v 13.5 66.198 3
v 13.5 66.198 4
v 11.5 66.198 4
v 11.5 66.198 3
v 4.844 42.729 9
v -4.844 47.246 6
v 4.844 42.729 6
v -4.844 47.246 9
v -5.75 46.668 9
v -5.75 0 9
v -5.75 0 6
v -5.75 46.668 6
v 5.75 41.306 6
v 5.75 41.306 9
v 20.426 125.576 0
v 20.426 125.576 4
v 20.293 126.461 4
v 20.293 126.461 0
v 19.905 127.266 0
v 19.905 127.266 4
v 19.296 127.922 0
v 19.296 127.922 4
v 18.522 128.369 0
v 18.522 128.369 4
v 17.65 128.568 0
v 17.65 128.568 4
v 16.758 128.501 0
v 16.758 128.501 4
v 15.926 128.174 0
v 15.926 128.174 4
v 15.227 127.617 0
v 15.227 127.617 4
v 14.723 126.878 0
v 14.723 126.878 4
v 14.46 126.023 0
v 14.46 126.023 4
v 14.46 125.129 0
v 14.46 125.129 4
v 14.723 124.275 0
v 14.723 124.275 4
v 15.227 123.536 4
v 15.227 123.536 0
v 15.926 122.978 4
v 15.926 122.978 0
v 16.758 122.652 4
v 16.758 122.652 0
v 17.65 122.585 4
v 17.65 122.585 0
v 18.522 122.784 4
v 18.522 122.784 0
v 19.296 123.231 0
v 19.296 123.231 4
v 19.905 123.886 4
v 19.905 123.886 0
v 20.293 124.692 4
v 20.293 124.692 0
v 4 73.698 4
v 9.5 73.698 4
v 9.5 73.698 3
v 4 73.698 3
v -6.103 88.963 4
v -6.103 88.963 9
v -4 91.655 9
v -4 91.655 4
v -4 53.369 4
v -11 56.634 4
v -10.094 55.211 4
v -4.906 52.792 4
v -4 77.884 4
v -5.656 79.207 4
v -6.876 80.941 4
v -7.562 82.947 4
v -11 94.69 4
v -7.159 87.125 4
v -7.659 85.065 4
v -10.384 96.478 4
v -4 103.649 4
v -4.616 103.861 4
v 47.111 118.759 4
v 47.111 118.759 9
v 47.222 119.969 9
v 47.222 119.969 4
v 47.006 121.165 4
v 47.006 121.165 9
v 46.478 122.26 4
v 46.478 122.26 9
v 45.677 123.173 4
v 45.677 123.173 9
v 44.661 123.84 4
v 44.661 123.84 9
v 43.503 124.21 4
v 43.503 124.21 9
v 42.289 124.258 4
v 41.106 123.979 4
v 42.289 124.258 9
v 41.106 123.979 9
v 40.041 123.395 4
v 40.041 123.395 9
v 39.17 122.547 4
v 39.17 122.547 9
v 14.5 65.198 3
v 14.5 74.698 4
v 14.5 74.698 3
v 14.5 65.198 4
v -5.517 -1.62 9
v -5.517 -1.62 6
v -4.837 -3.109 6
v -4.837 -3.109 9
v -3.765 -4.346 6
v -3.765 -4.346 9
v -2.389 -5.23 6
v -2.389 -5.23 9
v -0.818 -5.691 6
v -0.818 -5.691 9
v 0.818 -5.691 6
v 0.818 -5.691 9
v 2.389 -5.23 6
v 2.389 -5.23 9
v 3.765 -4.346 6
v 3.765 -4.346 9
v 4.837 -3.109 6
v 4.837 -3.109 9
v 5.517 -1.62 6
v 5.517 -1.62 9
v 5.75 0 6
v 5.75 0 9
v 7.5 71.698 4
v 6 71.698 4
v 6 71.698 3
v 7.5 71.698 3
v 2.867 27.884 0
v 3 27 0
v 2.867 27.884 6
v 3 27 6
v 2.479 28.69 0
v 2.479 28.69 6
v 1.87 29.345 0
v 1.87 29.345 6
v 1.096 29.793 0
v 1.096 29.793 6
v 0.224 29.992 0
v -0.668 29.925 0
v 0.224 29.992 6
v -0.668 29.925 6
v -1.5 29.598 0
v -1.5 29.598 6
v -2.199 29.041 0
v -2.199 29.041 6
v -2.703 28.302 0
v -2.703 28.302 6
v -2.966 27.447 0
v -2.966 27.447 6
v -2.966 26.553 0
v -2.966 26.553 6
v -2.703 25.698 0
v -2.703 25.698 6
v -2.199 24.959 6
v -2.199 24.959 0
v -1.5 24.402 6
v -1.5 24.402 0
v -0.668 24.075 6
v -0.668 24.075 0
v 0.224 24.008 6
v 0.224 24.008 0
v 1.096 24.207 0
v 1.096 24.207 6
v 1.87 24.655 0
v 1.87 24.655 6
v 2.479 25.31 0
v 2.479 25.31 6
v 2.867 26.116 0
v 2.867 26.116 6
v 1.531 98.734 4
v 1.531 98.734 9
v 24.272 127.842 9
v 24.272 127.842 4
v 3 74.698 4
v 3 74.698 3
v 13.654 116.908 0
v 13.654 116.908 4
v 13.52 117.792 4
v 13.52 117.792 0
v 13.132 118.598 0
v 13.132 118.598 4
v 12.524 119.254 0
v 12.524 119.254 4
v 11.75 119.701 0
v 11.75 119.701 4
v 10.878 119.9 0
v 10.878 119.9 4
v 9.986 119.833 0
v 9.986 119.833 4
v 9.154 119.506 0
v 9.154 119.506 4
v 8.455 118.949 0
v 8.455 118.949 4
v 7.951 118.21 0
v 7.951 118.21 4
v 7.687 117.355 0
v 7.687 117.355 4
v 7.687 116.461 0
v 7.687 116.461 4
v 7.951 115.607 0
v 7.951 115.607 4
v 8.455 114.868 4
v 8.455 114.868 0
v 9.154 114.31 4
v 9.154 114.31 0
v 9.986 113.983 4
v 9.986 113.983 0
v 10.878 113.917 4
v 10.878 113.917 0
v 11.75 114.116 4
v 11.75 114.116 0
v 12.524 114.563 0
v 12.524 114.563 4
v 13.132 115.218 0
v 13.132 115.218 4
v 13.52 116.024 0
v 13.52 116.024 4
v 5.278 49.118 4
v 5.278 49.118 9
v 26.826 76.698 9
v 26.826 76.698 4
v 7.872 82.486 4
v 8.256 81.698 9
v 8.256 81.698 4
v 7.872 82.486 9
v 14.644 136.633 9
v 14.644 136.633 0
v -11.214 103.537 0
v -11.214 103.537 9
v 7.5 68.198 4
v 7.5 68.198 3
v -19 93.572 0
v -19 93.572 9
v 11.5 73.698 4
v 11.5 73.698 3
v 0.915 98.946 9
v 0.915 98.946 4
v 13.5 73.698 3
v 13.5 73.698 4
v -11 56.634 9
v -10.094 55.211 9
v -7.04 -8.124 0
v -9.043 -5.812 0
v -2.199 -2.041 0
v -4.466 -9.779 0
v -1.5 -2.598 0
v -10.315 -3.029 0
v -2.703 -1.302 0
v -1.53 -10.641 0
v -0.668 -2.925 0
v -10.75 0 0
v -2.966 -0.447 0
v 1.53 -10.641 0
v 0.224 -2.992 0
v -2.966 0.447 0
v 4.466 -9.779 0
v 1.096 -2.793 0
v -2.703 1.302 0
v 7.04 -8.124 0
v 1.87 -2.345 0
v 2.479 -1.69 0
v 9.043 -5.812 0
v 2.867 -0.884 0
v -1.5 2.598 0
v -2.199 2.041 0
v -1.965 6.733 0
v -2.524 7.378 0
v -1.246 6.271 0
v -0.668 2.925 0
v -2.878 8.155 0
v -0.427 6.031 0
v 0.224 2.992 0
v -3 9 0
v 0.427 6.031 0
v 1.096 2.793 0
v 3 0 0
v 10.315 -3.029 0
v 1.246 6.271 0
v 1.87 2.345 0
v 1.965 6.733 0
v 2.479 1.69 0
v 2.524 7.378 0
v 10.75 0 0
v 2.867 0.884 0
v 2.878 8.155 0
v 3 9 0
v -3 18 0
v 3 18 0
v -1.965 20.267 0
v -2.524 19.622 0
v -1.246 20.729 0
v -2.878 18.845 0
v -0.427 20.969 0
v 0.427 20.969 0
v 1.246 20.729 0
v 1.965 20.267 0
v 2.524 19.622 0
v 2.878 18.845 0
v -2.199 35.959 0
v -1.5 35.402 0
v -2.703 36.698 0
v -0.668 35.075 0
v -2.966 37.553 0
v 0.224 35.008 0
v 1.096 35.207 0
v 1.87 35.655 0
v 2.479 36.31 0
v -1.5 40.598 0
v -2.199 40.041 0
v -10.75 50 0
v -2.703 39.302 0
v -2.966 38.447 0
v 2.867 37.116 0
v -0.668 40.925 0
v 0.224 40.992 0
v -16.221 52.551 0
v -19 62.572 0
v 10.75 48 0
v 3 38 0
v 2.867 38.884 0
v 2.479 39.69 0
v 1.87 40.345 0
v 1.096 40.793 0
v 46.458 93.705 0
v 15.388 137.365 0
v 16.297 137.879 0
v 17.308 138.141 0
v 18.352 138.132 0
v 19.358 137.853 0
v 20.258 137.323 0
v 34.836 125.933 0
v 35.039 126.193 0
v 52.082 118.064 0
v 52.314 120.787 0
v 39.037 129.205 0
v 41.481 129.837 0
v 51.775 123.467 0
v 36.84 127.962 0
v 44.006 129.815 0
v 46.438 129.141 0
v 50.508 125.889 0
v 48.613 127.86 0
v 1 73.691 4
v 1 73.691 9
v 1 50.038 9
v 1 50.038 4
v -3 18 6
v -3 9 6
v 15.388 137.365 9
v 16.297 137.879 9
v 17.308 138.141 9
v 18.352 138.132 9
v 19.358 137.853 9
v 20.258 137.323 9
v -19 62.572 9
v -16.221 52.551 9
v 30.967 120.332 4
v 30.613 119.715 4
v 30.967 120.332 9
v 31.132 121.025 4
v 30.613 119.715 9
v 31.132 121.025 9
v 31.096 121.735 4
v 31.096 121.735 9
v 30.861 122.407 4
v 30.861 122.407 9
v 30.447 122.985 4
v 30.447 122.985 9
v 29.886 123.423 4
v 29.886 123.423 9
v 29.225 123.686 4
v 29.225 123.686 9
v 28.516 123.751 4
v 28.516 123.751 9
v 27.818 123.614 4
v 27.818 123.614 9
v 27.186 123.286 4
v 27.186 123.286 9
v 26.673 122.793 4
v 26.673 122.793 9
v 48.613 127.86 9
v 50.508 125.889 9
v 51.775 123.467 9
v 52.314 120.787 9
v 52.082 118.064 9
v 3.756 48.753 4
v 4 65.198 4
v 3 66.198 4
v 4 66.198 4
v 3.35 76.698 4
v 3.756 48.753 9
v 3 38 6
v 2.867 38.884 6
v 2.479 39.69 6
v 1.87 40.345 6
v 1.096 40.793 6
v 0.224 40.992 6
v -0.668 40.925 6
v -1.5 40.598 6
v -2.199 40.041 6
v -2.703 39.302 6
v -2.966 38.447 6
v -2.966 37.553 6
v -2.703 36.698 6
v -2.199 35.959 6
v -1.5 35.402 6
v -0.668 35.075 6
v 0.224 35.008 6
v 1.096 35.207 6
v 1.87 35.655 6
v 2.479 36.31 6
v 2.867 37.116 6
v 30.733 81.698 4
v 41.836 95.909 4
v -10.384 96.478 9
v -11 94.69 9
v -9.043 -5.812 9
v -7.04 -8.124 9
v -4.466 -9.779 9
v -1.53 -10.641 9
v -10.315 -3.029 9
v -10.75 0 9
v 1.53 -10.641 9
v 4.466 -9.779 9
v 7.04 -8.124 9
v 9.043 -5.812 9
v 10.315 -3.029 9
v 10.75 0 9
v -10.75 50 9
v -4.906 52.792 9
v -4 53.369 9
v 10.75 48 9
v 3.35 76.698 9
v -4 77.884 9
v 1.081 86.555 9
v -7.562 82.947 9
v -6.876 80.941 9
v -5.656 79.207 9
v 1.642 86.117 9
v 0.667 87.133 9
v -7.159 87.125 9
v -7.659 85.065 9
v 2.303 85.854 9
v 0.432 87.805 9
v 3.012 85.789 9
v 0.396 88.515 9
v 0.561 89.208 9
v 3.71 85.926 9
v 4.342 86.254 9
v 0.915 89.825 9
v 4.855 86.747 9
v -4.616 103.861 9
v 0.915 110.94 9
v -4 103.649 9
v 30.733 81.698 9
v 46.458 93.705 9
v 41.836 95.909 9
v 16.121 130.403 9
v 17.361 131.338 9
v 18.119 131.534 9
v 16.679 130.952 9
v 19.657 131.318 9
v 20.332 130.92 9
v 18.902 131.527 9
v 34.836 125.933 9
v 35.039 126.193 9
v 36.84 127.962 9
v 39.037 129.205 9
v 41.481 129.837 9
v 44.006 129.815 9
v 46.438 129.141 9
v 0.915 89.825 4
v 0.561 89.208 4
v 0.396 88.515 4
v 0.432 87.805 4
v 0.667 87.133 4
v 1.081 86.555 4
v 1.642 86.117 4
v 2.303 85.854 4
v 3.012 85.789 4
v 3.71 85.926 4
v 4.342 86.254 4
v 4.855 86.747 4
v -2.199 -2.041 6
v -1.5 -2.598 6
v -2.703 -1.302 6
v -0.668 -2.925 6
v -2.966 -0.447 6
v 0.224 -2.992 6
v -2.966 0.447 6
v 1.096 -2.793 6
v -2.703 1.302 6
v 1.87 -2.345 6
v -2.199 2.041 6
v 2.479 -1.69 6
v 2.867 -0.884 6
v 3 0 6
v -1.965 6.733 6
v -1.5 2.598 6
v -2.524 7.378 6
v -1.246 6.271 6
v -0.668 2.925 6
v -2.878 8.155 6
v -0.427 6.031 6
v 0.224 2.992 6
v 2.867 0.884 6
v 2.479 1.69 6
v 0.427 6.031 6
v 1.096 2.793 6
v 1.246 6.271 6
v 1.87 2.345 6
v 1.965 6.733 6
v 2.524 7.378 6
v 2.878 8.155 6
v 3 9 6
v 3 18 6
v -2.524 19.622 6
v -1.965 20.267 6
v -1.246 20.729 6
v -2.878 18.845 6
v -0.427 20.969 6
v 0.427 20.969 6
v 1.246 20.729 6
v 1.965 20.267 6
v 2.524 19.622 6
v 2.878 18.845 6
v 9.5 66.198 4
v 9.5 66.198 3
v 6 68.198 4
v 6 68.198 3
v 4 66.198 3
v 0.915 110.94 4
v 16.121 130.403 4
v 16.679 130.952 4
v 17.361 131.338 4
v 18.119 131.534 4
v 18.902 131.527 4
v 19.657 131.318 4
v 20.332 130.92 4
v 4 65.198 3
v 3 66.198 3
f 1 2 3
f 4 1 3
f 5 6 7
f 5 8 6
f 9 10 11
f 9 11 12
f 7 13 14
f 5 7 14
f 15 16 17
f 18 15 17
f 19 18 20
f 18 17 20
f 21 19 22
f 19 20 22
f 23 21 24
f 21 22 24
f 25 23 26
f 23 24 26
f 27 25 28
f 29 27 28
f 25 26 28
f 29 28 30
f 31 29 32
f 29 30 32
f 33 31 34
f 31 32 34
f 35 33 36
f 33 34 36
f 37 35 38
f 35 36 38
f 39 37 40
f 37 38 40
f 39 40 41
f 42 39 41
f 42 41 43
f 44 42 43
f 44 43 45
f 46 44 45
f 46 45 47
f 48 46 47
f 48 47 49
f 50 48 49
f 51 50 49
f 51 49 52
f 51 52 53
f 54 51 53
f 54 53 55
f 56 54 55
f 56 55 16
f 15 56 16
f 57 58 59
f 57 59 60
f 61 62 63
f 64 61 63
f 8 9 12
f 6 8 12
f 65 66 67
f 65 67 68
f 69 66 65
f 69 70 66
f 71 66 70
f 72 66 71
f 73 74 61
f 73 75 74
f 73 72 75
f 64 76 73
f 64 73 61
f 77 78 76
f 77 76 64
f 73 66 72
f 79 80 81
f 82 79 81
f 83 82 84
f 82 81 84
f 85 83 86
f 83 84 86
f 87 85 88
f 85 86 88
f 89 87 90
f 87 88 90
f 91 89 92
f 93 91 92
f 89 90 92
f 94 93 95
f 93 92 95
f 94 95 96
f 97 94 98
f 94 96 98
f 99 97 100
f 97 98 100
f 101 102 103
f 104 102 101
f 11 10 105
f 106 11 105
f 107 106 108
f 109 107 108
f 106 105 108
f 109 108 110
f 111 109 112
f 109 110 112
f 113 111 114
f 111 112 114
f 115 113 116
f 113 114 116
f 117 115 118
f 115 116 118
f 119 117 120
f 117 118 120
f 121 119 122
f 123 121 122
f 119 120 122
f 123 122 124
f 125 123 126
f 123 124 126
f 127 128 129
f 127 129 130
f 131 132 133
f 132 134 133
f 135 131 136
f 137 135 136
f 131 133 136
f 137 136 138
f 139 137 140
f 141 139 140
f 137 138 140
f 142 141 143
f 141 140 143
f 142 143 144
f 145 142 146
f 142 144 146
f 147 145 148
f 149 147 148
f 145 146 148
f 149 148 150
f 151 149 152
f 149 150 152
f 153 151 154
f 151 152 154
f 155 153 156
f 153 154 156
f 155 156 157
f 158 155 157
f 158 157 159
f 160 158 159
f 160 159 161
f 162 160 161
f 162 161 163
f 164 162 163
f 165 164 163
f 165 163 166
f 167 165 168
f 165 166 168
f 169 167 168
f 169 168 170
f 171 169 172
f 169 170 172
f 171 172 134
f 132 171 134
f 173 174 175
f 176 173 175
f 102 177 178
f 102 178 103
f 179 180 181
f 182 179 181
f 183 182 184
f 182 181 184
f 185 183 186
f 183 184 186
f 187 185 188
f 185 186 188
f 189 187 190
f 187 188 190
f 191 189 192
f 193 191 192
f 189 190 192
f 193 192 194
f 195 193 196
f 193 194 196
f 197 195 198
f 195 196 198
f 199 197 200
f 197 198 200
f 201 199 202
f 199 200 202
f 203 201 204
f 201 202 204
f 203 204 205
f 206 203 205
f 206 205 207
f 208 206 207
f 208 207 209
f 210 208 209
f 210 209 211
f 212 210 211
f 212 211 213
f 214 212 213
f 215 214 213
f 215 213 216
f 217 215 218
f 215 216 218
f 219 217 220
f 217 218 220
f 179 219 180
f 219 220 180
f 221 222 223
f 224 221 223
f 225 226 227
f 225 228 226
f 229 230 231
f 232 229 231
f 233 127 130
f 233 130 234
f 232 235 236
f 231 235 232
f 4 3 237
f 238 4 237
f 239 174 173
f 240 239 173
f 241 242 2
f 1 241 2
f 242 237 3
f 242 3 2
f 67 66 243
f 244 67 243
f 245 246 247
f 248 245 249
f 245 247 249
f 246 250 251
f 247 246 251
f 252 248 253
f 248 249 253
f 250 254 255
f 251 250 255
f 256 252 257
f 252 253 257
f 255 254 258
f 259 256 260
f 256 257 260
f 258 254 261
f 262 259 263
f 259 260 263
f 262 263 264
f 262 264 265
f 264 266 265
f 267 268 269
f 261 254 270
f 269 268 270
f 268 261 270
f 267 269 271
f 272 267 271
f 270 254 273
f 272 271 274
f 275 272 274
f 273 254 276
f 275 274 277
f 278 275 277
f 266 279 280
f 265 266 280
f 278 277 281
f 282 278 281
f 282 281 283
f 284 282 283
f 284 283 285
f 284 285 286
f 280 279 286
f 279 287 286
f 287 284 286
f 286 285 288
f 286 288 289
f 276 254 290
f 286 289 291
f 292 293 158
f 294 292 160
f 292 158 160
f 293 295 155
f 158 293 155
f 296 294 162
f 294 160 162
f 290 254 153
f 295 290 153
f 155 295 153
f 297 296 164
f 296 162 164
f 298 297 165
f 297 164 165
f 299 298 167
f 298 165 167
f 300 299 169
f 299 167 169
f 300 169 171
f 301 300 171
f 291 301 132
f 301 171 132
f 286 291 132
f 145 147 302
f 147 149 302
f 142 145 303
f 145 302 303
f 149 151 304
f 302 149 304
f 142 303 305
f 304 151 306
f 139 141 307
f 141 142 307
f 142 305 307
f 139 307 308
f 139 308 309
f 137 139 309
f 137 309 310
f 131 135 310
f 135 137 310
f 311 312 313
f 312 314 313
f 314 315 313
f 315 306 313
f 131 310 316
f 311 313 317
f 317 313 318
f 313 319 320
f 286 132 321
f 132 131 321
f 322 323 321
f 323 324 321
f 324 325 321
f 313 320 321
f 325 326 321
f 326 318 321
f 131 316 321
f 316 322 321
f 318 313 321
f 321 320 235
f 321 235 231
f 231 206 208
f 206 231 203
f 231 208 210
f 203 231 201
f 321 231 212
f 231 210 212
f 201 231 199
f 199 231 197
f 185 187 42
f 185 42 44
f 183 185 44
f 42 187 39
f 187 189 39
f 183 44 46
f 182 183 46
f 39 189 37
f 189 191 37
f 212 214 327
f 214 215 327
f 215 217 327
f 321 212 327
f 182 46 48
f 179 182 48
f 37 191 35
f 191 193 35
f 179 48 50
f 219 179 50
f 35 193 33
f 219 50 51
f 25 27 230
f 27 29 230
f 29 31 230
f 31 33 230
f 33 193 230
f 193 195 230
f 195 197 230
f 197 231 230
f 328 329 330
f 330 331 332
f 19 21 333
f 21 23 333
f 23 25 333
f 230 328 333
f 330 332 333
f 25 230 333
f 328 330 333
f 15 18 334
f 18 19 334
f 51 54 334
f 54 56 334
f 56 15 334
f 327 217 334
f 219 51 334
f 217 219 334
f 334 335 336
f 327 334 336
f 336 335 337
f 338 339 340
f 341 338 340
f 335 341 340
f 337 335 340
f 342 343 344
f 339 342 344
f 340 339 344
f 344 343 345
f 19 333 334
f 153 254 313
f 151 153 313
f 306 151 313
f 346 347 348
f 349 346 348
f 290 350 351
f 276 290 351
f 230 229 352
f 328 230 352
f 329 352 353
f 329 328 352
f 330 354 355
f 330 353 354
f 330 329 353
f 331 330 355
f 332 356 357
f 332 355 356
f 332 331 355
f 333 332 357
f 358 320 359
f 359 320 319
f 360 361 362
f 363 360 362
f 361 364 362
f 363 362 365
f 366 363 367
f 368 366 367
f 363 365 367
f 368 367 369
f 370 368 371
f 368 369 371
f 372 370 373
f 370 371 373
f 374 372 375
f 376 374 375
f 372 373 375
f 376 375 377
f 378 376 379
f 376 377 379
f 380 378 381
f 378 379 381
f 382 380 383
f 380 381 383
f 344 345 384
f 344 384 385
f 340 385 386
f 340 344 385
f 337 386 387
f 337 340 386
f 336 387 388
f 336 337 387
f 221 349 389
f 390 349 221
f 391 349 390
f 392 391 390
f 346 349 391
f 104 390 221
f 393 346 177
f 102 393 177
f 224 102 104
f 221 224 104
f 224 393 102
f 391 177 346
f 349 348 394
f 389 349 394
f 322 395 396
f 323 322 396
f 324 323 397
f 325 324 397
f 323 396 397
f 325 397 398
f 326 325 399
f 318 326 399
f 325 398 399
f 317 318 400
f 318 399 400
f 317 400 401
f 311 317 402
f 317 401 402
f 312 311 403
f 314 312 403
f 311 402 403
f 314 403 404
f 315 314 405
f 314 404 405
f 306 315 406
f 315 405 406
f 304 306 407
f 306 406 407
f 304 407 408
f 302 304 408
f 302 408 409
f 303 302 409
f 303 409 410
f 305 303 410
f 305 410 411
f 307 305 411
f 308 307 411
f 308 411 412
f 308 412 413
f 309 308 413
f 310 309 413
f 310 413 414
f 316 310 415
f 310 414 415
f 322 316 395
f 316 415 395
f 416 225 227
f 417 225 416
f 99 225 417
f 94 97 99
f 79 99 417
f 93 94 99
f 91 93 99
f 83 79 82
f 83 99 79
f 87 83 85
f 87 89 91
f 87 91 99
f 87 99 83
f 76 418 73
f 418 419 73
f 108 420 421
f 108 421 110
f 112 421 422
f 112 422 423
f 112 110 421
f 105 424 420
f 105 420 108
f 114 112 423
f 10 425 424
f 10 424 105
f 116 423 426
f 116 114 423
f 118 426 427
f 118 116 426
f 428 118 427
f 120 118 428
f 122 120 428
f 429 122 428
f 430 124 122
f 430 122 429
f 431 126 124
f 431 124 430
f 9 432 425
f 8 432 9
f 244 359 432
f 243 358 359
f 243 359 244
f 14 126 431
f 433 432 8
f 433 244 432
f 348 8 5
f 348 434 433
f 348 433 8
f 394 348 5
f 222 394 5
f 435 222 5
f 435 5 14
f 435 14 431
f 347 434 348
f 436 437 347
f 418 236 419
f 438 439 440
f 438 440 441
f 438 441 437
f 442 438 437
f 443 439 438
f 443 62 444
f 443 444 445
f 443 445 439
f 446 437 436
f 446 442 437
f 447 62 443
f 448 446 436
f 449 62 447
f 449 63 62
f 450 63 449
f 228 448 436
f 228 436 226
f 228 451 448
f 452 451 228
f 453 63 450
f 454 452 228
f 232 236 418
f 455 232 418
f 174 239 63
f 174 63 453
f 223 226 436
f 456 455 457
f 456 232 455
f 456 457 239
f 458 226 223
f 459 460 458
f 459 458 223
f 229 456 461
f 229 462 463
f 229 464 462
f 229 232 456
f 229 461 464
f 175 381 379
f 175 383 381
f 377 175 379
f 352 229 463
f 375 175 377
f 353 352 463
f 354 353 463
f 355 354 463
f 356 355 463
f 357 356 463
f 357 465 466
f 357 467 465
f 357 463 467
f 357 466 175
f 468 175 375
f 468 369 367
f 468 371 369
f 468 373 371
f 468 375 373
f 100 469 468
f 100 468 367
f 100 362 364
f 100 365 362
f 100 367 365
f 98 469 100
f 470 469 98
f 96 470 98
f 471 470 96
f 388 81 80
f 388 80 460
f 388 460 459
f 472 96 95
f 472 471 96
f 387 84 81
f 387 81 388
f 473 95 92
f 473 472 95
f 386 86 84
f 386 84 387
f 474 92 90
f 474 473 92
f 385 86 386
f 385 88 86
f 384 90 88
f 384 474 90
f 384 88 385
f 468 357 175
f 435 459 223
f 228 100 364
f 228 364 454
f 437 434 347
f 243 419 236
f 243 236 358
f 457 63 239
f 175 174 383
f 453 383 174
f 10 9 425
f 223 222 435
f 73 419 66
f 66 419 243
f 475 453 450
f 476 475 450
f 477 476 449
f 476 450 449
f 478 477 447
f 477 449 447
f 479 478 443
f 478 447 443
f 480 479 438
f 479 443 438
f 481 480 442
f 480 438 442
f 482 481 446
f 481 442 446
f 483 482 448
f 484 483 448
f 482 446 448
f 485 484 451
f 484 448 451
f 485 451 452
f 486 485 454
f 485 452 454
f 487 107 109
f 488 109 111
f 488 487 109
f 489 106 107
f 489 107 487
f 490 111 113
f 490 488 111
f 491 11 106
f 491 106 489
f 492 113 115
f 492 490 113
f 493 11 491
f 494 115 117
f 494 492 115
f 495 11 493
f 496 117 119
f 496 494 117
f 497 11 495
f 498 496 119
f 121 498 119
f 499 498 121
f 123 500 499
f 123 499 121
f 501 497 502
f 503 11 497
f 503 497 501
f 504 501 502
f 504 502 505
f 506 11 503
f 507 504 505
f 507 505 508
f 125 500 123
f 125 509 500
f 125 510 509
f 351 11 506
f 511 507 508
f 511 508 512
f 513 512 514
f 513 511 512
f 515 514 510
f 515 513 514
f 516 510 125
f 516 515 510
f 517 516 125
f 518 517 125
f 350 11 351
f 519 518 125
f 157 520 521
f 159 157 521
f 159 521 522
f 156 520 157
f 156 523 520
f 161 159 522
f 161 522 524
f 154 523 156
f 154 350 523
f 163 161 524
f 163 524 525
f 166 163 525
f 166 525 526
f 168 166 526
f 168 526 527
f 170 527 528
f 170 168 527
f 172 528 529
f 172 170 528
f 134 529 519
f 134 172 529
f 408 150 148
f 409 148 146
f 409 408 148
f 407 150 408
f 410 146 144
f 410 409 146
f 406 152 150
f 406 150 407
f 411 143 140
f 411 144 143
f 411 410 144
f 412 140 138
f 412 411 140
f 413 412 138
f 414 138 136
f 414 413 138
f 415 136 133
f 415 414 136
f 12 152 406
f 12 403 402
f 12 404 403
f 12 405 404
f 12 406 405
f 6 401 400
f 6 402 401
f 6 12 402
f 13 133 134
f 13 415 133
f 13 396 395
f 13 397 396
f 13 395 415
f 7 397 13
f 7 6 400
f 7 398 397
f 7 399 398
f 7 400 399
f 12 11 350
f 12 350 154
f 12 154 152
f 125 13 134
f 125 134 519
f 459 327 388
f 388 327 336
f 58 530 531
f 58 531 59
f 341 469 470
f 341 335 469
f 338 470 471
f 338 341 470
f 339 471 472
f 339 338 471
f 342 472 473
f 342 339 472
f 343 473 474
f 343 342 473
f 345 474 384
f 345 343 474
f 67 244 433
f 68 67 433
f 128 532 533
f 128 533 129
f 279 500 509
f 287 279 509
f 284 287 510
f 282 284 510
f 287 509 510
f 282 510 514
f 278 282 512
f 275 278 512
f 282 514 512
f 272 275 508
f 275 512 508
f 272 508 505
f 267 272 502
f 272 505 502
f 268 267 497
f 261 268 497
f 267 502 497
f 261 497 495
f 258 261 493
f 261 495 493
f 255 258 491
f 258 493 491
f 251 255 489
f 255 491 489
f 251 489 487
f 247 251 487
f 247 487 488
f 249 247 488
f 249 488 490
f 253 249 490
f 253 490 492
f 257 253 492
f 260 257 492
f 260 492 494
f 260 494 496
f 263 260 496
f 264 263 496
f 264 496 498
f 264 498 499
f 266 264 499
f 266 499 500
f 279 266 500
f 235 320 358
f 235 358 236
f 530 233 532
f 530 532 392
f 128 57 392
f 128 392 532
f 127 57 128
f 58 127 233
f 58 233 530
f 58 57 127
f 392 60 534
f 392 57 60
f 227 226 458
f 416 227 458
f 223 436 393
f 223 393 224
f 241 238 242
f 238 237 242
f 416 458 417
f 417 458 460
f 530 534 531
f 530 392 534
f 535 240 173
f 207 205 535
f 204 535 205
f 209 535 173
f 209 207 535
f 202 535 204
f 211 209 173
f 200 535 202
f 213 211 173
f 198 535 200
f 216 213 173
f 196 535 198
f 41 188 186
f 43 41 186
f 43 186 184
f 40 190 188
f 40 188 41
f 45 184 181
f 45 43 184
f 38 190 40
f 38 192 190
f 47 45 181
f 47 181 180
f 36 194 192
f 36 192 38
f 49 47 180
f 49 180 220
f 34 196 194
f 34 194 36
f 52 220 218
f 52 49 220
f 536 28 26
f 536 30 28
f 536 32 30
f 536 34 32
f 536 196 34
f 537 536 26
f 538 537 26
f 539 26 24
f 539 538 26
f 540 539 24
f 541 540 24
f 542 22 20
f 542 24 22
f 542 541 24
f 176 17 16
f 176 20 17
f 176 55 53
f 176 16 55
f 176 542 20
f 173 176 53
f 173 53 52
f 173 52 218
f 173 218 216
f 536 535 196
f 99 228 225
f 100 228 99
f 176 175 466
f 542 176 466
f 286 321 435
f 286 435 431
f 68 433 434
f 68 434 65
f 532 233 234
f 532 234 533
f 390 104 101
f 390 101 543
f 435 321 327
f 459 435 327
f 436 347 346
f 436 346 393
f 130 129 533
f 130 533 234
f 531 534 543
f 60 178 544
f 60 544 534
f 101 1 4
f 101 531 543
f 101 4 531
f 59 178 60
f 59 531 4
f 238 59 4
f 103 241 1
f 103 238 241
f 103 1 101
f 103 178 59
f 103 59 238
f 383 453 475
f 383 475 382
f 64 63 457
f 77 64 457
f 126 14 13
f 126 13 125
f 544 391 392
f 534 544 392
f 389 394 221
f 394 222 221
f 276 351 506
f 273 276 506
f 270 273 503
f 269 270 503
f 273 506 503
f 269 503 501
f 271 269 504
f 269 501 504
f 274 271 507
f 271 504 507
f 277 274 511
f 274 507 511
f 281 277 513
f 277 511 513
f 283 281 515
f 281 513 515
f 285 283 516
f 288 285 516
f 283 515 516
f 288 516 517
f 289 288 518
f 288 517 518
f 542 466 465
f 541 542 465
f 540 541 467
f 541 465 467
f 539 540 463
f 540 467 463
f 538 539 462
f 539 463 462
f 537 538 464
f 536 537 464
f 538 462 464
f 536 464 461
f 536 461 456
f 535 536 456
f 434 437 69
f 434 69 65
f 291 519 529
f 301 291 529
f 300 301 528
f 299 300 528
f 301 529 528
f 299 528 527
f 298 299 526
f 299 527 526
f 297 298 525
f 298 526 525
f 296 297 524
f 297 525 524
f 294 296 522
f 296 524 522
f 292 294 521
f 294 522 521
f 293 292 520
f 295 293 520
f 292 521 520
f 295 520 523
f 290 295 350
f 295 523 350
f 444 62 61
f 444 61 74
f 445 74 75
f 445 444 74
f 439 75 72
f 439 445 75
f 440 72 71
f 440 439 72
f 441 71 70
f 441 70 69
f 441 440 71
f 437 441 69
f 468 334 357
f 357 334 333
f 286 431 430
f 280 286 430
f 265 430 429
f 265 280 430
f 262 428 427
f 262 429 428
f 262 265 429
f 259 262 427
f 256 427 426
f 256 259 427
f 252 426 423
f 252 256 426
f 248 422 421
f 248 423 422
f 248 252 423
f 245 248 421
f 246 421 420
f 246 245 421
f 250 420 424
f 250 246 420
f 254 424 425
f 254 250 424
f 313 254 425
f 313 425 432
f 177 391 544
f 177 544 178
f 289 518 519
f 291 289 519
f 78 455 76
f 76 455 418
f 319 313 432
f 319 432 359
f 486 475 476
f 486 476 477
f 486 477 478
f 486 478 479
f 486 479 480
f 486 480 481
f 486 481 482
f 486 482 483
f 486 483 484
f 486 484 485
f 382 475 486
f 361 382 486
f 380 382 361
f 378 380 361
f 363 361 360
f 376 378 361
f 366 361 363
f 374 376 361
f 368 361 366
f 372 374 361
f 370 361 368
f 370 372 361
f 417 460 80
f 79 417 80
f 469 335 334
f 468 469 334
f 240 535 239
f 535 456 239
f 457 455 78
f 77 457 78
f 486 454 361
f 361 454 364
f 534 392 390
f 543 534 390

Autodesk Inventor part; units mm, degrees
ref_plane "YZ Plane" through (0, 0, 0) normal (1, 0, 0) x (0, 1, 0)
sketch "Base" plane through (0, 0, 0) normal (0, 0, 1) x (1, 0, 0)
  line L0 (0, -40.5971) -> (0, 168.3327) construction
  arc A0 (-10.75, 0) -> (10.75, 0) centre (0, 0) ccw
  line L1 (10.75, 48) -> (10.75, 0)
  line L2 (-10.75, 0) -> (-10.75, 50)
  line L3 (-19, 62.5716) -> (-16.2211, 52.5512)
  line L4 (-10.75, 50) -> (-16.2211, 52.5512)
  line L5 (-19, 62.5716) -> (-19, 93.5716)
  line L6 (-19, 93.5716) -> (-11.2142, 103.5369)
  line L7 (10.75, 48) -> (46.4584, 93.7046)
  line L8 (46.4584, 93.7046) -> (52.0821, 118.0639)
  arc A1 (52.0821, 118.0639) -> (48.6133, 127.8595) centre (42.6597, 120.2392) ccw
  arc A2 (48.6133, 127.8595) -> (35.0394, 126.1928) centre (42.6597, 120.2392) ccw
  line L9 (34.8364, 125.933) -> (20.2582, 137.3228)
  line L10 (35.0394, 126.1928) -> (34.8364, 125.933)
  arc A3 (20.2582, 137.3228) -> (14.6435, 136.6334) centre (17.7956, 134.1707) ccw
  line L11 (14.6435, 136.6334) -> (-11.2142, 103.5369)
  line L12 (42.6597, 120.2392) -> (48.6133, 127.8595) construction
  dimension "d0" = 142
  dimension "d1" = 155
  dimension "d2" = 21.5
  dimension "d3" = 115
  dimension "d4" = 130.5
  dimension "d7" = 51.5
  dimension "d8" = 18.5
  dimension "d9" = 4
  dimension "d10" = 58
  dimension "d11" = 25
  dimension "d14" = 42
  dimension "d15" = 50
  dimension "d18" = 10
  dimension "d57" = 48
  dimension "d100" = 19
  dimension "d101" = 31
extrude "BaseFeature" add sketch "Base" along normal blind 9
ref_plane "SunkenDetailsPlane" through (0, 0, 9) normal (0, 0, 1) x (1, 0, 0)
sketch "SunkenDetails" plane through (0, 0, 9) normal (0, 0, 1) x (1, 0, 0)
  line L0 (0.9151, 89.8249) -> (26.6729, 122.7934)
  line L1 (4.8551, 86.7466) -> (30.613, 119.7151)
  arc A0 (30.613, 119.7151) -> (26.6729, 122.7934) centre (28.6429, 121.2543) ccw
  line L2 (0.9151, 97.9462) -> (24.272, 127.8418)
  line L3 (24.272, 127.8418) -> (20.332, 130.9201)
  line L4 (16.1209, 130.403) -> (0.9151, 110.9404)
  arc A1 (20.332, 130.9201) -> (16.1209, 130.403) centre (18.485, 128.556) ccw
  line L5 (-4, 91.6552) -> (-4, 104.6494)
  line L6 (-4, 104.6494) -> (-11, 95.6898)
  line L7 (-11, 95.6898) -> (-11, 55.6335)
  line L8 (-11, 55.6335) -> (-4, 52.3693)
  line L9 (-4, 77.8836) -> (-4, 52.3693)
  arc A2 (-6.1033, 88.9631) -> (-4, 77.8836) centre (-0.1932, 84.3457) ccw
  line L10 (-6.1033, 88.9631) -> (-4, 91.6552)
  line L11 (5.75, 42.3059) -> (5.75, 0)
  line L12 (-5.75, 47.6685) -> (5.75, 42.3059)
  line L13 (-5.75, 0) -> (-5.75, 47.6685)
  arc A3 (-5.75, 0) -> (5.75, 0) centre (0, 0) ccw
  line L14 (4.6626, 48.3299) -> (26.8264, 76.6983)
  line L15 (3.3496, 76.6983) -> (26.8264, 76.6983)
  line L16 (1, 73.6909) -> (3.3496, 76.6983)
  arc A4 (0.9151, 89.8249) -> (4.8551, 86.7466) centre (2.8851, 88.2857) ccw
  line L17 (7.256, 81.6983) -> (30.7329, 81.6983)
  line L18 (7.256, 81.6983) -> (39.1705, 122.5469)
  line L19 (30.7329, 81.6983) -> (41.8359, 95.9094)
  line L20 (41.8359, 95.9094) -> (47.1112, 118.7594)
  arc A5 (47.1112, 118.7594) -> (39.1705, 122.5469) centre (42.721, 119.7729) ccw
  line L21 (10.75, 0) -> (10.75, 48) construction
  arc A6 (-10.75, 0) -> (10.75, 0) centre (0, 0) ccw construction
  line L22 (10.75, 0) -> (10.75, 48) construction
  line L23 (10.75, 48) -> (46.4584, 93.7046) construction
  line L24 (46.4584, 93.7046) -> (52.0821, 118.0639) construction
  arc A7 (52.0821, 118.0639) -> (35.0394, 126.1928) centre (42.6597, 120.2392) ccw construction
  line L25 (35.0394, 126.1928) -> (34.8364, 125.933) construction
  line L26 (34.8364, 125.933) -> (20.2582, 137.3228) construction
  arc A8 (20.2582, 137.3228) -> (14.6435, 136.6334) centre (17.7956, 134.1707) ccw construction
  line L27 (14.6435, 136.6334) -> (-19, 93.5716) construction
  line L28 (-19, 93.5716) -> (-19, 62.5716) construction
  line L29 (-19, 62.5716) -> (-16.2211, 52.5512) construction
  line L30 (-16.2211, 52.5512) -> (-10.75, 50) construction
  line L31 (-10.75, 50) -> (-10.75, 0) construction
  line L32 (-10.75, 50) -> (-10.75, 0) construction
  line L33 (10.75, 48) -> (46.4584, 93.7046) construction
  line L34 (-19, 93.5716) -> (-19, 62.5716) construction
  line L35 (14.6435, 136.6334) -> (-19, 93.5716) construction
  line L36 (46.4584, 93.7046) -> (52.0821, 118.0639) construction
  line L37 (34.8364, 125.933) -> (20.2582, 137.3228) construction
  arc A9 (-10.75, 0) -> (10.75, 0) centre (0, 0) ccw construction
  line L38 (24.272, 127.8418) -> (30.1821, 123.2243) construction
  line L39 (-10.75, 50) -> (-5.75, 47.6685) construction
  line L40 (-16.2211, 52.5512) -> (-10.75, 50) construction
  line L41 (2.8851, 88.2857) -> (-0.1932, 84.3457) construction
  line L42 (0.9151, 110.9404) -> (0.9151, 97.9462)
  line L43 (0.9151, 97.9462) -> (-4, 91.6552) construction
  line L44 (0.9151, 97.9462) -> (0.9151, 89.8249) construction
  line L45 (39.1705, 122.5469) -> (34.8364, 125.933) construction
  line L46 (1.346, 86.3157) -> (7.256, 81.6983) construction
  line L47 (1, 73.6909) -> (1, 50.0378)
  line L48 (1, 50.0378) -> (4.6626, 48.3299)
  point P0 (-11.2142, 103.5369)
  dimension "d23" = 5
  dimension "d30" = 8
  dimension "d32" = 5
  dimension "d34" = 5
  dimension "d35" = 5
  dimension "d36" = 5
  dimension "d49" = 5
  dimension "d54" = 5
  dimension "d59" = 5
  dimension "d60" = 5
  dimension "d61" = 5
  dimension "d66" = 5
  dimension "d76" = 3
  dimension "d77" = 7
  dimension "d102" = 5
  dimension "d103" = 5
  dimension "d104" = 36
extrude "SunkenDetailsFeature" cut sketch "SunkenDetails" against normal blind 5 contours L0 A0 L1 A4 | L42 L4 A1 L3 L2 | L10 A2 L9 L8 L7 L6 L5 | L48 L47 L16 L15 L14 | L18 A5 L20 L19 L17
ref_plane "HolesPlane" through (-11, 95.6898, 6.5) normal (0, 0, 1) x (1, 0, 0)
sketch "Holes" plane through (-11, 95.6898, 6.5) normal (0, 0, 1) x (1, 0, 0)
  circle A0 centre (21.6537, 21.2184) radius 3
  circle A1 centre (28.426, 29.8865) radius 3
  circle A2 centre (11, -57.6898) radius 3
  circle A3 centre (11, -68.6898) radius 3
  line L0 (8, -77.6898) -> (8, -86.6898)
  arc A4 (8, -86.6898) -> (14, -86.6898) centre (11, -86.6898) ccw
  line L1 (14, -86.6898) -> (14, -77.6898)
  arc A5 (14, -77.6898) -> (8, -77.6898) centre (11, -77.6898) ccw
  circle A6 centre (11, -95.6898) radius 3
  line L2 (11.9151, 15.2506) -> (27.1209, 34.7132) construction
  line L3 (35.272, 32.152) -> (11.9151, 2.2564) construction
  line L4 (21.6537, 21.2184) -> (28.426, 29.8865) construction
  line L5 (31.332, 35.2303) -> (35.272, 32.152) projected
  arc A7 (0.25, -95.6898) -> (21.75, -95.6898) centre (11, -95.6898) ccw construction
  line L6 (0.25, -45.6898) -> (0.25, -95.6898) construction
  line L7 (21.75, -95.6898) -> (21.75, -47.6898) construction
  line L8 (11, -57.6898) -> (11, -95.6898) construction
  dimension "d83" = 6
  dimension "d84" = 9
  dimension "d85" = 9
  dimension "d86" = 9
  dimension "d87" = 11
  dimension "d88" = 8
  dimension "d89" = 11
  dimension "d90" = 4
  dimension "d91" = 6
extrude "HolesFeature" cut sketch "Holes" against normal through all
extrude "SunkenDetailFeature" cut sketch "SunkenDetails" against normal blind 3 contours L11 A3 L13 L12
chamfer "DetailChamfersFeature" distance 1 angle 45 9 edges at (0.9151, 97.9462, 6.5) (-4, 104.6494, 6.5) (-11, 95.6898, 6.5) (-5.75, 47.6685, 7.5) (5.75, 42.3059, 7.5) (-4, 52.3693, 6.5) (7.256, 81.6983, 6.5) (4.6626, 48.3299, 6.5) (-11, 55.6335, 6.5)
sketch "Logo" plane through (0, 0, 4) normal (0, 0, 1) x (1, 0, 0)
  line L0 (6, 71.6983) -> (7.5, 71.6983)
  line L1 (7.5, 71.6983) -> (7.5, 68.1983)
  line L2 (9.5, 73.6983) -> (4, 73.6983)
  line L3 (9.5, 66.1983) -> (9.5, 73.6983)
  line L4 (11.5, 66.1983) -> (11.5, 73.6983)
  line L5 (14.5, 65.1983) -> (4, 65.1983)
  line L6 (14.5, 74.6983) -> (14.5, 65.1983)
  line L7 (13.5, 66.1983) -> (11.5, 66.1983)
  line L8 (13.5, 73.6983) -> (13.5, 66.1983)
  line L9 (3, 74.6983) -> (14.5, 74.6983)
  line L10 (11.5, 73.6983) -> (13.5, 73.6983)
  line L11 (6, 68.1983) -> (6, 71.6983)
  line L12 (4, 73.6983) -> (4, 66.1983)
  line L13 (3, 66.1983) -> (3, 74.6983)
  line L14 (4, 66.1983) -> (9.5, 66.1983)
  line L15 (4, 66.1983) -> (4, 65.1983)
  line L16 (3, 66.1983) -> (4, 66.1983)
  line L17 (7.5, 68.1983) -> (6, 68.1983)
  line L18 (3.3496, 76.6983) -> (26.8264, 76.6983) construction
  line L19 (1, 50.0378) -> (1, 73.6909) construction
  dimension "d140" = 1
  dimension "d141" = 1
  dimension "d142" = 1
  dimension "d143" = 1
  dimension "d144" = 2
  dimension "d145" = 1.5
  dimension "d146" = 2
  dimension "d147" = 2
  dimension "d148" = 2
  dimension "d149" = 9.5
  dimension "d150" = 2
  dimension "d151" = 2
  dimension "d152" = 2
  dimension "d153" = 2
extrude "LogoFeature" cut sketch "Logo" against normal blind 1
properties part number "ShinConnector"
